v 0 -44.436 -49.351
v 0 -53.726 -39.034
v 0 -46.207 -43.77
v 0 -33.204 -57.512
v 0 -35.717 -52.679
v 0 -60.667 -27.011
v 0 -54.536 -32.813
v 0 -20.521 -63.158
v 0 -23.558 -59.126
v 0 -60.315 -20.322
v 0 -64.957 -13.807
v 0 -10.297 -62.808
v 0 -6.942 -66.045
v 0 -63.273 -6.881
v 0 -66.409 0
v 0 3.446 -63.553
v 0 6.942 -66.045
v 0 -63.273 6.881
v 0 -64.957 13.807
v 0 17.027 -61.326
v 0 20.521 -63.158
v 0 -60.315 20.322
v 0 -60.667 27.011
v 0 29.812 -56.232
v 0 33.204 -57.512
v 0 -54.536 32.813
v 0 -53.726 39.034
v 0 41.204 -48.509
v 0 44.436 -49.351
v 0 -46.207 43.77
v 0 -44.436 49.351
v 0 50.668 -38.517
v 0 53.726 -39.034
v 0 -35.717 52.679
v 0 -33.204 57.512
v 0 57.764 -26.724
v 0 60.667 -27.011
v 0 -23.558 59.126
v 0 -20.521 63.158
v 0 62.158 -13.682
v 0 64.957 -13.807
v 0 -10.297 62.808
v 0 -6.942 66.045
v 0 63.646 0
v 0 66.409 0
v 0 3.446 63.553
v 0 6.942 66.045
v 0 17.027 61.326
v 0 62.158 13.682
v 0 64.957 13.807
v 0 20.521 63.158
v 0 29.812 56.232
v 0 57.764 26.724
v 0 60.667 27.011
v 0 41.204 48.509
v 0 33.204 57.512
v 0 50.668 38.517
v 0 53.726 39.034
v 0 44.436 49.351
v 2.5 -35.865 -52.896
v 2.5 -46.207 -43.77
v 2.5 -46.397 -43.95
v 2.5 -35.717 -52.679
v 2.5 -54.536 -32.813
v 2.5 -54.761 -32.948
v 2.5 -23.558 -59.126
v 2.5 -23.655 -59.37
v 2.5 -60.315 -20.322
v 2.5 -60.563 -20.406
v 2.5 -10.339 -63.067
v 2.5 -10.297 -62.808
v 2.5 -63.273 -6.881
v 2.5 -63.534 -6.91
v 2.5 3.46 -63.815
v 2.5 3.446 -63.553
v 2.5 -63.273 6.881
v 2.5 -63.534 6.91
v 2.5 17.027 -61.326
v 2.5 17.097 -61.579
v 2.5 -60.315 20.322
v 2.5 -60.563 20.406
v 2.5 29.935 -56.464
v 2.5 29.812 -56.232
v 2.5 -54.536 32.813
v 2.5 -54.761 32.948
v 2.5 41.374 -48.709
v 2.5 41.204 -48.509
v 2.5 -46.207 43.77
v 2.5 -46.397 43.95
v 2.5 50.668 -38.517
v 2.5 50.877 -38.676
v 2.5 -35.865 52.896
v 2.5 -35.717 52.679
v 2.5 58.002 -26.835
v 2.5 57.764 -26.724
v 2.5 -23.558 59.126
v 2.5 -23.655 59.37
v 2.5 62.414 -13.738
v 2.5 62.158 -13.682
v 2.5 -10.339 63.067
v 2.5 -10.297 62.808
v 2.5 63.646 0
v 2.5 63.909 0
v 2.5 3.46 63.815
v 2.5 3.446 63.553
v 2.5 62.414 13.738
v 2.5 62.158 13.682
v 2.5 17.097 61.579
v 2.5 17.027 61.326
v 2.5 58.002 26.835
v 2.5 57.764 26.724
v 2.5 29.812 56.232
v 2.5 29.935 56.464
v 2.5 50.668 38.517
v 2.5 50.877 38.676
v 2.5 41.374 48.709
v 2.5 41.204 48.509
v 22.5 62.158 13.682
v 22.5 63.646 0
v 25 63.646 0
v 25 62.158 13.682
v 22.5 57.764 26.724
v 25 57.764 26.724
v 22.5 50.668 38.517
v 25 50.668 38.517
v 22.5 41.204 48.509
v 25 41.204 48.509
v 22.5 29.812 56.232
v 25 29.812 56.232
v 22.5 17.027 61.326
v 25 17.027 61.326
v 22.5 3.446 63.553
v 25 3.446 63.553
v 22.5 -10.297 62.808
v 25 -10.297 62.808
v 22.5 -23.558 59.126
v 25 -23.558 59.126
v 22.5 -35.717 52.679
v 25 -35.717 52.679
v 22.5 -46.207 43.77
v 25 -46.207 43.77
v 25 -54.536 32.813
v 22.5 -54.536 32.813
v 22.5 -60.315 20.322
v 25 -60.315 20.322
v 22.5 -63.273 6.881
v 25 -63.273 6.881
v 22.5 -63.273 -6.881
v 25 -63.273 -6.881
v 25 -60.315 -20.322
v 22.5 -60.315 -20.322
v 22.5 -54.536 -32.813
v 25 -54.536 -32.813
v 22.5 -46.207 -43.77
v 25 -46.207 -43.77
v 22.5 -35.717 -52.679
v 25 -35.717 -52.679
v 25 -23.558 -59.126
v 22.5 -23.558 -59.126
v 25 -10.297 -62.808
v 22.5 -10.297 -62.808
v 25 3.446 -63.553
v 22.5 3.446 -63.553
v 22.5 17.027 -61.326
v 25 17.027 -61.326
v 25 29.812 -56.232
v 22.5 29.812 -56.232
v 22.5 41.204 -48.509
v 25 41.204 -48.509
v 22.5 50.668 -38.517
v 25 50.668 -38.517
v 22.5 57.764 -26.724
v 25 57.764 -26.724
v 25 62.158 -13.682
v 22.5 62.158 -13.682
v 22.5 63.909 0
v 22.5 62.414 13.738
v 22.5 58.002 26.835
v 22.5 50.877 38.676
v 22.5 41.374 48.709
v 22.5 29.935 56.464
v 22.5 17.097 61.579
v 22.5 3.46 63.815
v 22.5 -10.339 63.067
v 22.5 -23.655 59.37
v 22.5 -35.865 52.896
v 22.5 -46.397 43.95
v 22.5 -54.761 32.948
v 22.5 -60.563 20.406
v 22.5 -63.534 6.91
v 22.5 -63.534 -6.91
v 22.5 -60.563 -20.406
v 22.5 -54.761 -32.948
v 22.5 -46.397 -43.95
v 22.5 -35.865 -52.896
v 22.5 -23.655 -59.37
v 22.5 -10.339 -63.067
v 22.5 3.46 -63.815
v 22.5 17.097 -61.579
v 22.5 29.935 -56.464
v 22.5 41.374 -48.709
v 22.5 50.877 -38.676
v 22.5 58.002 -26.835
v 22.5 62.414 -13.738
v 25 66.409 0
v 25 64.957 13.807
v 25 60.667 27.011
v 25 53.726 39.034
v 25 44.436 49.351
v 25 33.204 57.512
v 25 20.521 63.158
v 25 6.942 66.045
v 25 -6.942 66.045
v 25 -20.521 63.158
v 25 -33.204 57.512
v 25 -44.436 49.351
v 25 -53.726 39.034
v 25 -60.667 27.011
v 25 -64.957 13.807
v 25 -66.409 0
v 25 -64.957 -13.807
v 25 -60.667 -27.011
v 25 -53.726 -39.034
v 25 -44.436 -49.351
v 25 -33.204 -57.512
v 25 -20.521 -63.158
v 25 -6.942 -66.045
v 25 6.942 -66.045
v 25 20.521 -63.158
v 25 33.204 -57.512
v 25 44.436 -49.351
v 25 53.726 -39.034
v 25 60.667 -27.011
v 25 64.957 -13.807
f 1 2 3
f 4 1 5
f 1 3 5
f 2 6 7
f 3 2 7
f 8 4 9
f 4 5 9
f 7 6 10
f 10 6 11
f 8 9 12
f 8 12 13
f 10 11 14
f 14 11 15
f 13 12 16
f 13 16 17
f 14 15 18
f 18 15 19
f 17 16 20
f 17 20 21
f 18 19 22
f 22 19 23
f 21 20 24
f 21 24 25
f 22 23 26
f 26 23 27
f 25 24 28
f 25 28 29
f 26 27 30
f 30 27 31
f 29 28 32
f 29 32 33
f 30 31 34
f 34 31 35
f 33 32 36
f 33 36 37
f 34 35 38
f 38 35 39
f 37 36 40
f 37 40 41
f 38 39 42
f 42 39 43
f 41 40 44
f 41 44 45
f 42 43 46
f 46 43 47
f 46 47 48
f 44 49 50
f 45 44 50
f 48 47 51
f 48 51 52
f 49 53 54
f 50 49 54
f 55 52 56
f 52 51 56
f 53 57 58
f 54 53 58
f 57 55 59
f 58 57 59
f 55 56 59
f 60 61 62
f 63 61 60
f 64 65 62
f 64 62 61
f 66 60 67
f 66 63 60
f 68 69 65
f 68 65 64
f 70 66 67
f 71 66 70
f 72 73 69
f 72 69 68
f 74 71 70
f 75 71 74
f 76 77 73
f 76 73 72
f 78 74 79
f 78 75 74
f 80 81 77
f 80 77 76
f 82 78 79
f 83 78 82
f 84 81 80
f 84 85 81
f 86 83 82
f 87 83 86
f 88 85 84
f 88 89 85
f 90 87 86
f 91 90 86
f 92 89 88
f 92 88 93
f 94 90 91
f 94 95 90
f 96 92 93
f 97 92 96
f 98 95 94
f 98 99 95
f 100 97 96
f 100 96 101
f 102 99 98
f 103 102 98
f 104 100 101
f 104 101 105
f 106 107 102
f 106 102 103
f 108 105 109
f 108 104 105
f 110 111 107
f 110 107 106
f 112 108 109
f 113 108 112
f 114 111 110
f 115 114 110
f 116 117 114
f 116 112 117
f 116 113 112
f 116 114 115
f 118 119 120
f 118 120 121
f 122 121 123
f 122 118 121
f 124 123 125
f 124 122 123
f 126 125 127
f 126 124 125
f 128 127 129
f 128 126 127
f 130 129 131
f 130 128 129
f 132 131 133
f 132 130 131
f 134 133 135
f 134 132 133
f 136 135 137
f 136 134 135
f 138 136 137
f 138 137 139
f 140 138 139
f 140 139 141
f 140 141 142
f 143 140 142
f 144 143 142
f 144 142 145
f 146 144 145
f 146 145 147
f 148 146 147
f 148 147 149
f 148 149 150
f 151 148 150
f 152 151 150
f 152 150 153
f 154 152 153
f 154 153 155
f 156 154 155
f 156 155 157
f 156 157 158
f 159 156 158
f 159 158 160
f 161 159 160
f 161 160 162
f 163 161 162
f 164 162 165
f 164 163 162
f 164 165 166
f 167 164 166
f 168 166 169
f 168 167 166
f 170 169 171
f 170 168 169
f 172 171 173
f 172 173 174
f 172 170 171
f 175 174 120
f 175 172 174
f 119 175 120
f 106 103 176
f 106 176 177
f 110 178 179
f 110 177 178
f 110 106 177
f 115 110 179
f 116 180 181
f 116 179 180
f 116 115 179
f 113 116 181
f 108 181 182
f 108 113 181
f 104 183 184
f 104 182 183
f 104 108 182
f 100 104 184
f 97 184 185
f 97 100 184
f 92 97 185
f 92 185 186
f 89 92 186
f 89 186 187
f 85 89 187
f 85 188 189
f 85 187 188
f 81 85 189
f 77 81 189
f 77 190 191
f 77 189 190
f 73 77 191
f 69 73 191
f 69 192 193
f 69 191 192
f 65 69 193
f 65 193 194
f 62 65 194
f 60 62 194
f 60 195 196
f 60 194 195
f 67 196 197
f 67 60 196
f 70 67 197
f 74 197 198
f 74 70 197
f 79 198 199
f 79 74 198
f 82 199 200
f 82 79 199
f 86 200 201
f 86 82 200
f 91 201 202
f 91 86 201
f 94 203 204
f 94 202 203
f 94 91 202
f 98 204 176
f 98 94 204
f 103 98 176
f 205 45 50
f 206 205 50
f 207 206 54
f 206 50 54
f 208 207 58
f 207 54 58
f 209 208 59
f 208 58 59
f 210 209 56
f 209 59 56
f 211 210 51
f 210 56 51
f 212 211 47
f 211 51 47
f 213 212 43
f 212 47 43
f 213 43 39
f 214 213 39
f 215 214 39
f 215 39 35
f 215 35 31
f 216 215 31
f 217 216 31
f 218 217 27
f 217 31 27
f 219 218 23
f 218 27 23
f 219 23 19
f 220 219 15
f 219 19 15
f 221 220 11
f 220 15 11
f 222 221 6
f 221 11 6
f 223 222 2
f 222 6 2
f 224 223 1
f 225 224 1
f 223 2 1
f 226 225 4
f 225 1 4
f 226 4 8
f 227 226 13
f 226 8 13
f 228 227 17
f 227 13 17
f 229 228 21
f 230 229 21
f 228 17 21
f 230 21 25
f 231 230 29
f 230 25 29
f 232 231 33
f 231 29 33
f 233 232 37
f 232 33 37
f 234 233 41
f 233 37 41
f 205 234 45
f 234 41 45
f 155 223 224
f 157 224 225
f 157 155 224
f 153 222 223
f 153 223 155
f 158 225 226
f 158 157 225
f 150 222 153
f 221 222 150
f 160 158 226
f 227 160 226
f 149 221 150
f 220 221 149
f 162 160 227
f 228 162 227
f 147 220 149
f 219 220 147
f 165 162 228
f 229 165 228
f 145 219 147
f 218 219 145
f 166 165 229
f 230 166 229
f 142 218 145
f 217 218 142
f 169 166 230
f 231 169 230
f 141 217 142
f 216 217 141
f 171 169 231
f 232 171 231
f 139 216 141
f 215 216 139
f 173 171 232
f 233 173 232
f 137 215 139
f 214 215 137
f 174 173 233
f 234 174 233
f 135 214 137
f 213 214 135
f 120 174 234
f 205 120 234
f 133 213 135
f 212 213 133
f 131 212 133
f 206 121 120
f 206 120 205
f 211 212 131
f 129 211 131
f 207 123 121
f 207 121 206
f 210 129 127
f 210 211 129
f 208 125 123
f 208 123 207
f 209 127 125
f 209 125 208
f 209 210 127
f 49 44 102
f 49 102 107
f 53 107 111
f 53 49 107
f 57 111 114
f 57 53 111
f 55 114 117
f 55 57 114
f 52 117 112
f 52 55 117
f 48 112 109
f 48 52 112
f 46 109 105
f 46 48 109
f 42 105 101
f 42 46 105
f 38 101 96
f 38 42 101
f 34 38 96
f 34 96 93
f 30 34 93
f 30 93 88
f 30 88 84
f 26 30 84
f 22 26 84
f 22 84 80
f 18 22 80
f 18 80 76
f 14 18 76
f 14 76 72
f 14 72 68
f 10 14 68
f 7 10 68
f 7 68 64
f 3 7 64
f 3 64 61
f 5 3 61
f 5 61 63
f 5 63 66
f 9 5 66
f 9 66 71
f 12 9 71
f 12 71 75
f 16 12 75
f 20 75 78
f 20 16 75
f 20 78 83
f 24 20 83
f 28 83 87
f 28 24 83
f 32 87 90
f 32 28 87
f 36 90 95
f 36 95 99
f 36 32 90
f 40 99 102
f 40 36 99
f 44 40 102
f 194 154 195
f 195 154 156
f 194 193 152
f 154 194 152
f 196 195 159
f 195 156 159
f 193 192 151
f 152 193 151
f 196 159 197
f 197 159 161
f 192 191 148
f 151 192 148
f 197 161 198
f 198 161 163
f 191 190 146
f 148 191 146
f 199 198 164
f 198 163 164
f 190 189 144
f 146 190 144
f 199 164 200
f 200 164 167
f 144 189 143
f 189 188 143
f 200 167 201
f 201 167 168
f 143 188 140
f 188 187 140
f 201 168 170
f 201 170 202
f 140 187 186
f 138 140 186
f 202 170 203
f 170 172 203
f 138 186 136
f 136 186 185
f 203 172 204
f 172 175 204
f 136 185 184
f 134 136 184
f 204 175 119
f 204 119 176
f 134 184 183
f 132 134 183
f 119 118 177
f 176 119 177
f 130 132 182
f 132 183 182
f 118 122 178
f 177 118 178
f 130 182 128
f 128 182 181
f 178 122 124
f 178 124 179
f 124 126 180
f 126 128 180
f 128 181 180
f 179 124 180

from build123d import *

# Parameters (mm, degrees)
F0_R     = 66.408599
F0_R_2   = 63.646322
F1_DEPTH = 25
F2_T     = -2.5


with BuildPart() as f1:
    # F0 (on Right) → F1 (new body)
    with BuildSketch(Plane.YZ):
        Circle(F0_R)
        Circle(F0_R_2, mode=Mode.SUBTRACT)
    extrude(amount=F1_DEPTH)

    # F2
    f2_openings = [f1.faces().sort_by_distance(p)[0] for p in [
        (12.5, -63.646322, 0),
    ]]
    offset(amount=F2_T, openings=f2_openings)


solid = f1.part
